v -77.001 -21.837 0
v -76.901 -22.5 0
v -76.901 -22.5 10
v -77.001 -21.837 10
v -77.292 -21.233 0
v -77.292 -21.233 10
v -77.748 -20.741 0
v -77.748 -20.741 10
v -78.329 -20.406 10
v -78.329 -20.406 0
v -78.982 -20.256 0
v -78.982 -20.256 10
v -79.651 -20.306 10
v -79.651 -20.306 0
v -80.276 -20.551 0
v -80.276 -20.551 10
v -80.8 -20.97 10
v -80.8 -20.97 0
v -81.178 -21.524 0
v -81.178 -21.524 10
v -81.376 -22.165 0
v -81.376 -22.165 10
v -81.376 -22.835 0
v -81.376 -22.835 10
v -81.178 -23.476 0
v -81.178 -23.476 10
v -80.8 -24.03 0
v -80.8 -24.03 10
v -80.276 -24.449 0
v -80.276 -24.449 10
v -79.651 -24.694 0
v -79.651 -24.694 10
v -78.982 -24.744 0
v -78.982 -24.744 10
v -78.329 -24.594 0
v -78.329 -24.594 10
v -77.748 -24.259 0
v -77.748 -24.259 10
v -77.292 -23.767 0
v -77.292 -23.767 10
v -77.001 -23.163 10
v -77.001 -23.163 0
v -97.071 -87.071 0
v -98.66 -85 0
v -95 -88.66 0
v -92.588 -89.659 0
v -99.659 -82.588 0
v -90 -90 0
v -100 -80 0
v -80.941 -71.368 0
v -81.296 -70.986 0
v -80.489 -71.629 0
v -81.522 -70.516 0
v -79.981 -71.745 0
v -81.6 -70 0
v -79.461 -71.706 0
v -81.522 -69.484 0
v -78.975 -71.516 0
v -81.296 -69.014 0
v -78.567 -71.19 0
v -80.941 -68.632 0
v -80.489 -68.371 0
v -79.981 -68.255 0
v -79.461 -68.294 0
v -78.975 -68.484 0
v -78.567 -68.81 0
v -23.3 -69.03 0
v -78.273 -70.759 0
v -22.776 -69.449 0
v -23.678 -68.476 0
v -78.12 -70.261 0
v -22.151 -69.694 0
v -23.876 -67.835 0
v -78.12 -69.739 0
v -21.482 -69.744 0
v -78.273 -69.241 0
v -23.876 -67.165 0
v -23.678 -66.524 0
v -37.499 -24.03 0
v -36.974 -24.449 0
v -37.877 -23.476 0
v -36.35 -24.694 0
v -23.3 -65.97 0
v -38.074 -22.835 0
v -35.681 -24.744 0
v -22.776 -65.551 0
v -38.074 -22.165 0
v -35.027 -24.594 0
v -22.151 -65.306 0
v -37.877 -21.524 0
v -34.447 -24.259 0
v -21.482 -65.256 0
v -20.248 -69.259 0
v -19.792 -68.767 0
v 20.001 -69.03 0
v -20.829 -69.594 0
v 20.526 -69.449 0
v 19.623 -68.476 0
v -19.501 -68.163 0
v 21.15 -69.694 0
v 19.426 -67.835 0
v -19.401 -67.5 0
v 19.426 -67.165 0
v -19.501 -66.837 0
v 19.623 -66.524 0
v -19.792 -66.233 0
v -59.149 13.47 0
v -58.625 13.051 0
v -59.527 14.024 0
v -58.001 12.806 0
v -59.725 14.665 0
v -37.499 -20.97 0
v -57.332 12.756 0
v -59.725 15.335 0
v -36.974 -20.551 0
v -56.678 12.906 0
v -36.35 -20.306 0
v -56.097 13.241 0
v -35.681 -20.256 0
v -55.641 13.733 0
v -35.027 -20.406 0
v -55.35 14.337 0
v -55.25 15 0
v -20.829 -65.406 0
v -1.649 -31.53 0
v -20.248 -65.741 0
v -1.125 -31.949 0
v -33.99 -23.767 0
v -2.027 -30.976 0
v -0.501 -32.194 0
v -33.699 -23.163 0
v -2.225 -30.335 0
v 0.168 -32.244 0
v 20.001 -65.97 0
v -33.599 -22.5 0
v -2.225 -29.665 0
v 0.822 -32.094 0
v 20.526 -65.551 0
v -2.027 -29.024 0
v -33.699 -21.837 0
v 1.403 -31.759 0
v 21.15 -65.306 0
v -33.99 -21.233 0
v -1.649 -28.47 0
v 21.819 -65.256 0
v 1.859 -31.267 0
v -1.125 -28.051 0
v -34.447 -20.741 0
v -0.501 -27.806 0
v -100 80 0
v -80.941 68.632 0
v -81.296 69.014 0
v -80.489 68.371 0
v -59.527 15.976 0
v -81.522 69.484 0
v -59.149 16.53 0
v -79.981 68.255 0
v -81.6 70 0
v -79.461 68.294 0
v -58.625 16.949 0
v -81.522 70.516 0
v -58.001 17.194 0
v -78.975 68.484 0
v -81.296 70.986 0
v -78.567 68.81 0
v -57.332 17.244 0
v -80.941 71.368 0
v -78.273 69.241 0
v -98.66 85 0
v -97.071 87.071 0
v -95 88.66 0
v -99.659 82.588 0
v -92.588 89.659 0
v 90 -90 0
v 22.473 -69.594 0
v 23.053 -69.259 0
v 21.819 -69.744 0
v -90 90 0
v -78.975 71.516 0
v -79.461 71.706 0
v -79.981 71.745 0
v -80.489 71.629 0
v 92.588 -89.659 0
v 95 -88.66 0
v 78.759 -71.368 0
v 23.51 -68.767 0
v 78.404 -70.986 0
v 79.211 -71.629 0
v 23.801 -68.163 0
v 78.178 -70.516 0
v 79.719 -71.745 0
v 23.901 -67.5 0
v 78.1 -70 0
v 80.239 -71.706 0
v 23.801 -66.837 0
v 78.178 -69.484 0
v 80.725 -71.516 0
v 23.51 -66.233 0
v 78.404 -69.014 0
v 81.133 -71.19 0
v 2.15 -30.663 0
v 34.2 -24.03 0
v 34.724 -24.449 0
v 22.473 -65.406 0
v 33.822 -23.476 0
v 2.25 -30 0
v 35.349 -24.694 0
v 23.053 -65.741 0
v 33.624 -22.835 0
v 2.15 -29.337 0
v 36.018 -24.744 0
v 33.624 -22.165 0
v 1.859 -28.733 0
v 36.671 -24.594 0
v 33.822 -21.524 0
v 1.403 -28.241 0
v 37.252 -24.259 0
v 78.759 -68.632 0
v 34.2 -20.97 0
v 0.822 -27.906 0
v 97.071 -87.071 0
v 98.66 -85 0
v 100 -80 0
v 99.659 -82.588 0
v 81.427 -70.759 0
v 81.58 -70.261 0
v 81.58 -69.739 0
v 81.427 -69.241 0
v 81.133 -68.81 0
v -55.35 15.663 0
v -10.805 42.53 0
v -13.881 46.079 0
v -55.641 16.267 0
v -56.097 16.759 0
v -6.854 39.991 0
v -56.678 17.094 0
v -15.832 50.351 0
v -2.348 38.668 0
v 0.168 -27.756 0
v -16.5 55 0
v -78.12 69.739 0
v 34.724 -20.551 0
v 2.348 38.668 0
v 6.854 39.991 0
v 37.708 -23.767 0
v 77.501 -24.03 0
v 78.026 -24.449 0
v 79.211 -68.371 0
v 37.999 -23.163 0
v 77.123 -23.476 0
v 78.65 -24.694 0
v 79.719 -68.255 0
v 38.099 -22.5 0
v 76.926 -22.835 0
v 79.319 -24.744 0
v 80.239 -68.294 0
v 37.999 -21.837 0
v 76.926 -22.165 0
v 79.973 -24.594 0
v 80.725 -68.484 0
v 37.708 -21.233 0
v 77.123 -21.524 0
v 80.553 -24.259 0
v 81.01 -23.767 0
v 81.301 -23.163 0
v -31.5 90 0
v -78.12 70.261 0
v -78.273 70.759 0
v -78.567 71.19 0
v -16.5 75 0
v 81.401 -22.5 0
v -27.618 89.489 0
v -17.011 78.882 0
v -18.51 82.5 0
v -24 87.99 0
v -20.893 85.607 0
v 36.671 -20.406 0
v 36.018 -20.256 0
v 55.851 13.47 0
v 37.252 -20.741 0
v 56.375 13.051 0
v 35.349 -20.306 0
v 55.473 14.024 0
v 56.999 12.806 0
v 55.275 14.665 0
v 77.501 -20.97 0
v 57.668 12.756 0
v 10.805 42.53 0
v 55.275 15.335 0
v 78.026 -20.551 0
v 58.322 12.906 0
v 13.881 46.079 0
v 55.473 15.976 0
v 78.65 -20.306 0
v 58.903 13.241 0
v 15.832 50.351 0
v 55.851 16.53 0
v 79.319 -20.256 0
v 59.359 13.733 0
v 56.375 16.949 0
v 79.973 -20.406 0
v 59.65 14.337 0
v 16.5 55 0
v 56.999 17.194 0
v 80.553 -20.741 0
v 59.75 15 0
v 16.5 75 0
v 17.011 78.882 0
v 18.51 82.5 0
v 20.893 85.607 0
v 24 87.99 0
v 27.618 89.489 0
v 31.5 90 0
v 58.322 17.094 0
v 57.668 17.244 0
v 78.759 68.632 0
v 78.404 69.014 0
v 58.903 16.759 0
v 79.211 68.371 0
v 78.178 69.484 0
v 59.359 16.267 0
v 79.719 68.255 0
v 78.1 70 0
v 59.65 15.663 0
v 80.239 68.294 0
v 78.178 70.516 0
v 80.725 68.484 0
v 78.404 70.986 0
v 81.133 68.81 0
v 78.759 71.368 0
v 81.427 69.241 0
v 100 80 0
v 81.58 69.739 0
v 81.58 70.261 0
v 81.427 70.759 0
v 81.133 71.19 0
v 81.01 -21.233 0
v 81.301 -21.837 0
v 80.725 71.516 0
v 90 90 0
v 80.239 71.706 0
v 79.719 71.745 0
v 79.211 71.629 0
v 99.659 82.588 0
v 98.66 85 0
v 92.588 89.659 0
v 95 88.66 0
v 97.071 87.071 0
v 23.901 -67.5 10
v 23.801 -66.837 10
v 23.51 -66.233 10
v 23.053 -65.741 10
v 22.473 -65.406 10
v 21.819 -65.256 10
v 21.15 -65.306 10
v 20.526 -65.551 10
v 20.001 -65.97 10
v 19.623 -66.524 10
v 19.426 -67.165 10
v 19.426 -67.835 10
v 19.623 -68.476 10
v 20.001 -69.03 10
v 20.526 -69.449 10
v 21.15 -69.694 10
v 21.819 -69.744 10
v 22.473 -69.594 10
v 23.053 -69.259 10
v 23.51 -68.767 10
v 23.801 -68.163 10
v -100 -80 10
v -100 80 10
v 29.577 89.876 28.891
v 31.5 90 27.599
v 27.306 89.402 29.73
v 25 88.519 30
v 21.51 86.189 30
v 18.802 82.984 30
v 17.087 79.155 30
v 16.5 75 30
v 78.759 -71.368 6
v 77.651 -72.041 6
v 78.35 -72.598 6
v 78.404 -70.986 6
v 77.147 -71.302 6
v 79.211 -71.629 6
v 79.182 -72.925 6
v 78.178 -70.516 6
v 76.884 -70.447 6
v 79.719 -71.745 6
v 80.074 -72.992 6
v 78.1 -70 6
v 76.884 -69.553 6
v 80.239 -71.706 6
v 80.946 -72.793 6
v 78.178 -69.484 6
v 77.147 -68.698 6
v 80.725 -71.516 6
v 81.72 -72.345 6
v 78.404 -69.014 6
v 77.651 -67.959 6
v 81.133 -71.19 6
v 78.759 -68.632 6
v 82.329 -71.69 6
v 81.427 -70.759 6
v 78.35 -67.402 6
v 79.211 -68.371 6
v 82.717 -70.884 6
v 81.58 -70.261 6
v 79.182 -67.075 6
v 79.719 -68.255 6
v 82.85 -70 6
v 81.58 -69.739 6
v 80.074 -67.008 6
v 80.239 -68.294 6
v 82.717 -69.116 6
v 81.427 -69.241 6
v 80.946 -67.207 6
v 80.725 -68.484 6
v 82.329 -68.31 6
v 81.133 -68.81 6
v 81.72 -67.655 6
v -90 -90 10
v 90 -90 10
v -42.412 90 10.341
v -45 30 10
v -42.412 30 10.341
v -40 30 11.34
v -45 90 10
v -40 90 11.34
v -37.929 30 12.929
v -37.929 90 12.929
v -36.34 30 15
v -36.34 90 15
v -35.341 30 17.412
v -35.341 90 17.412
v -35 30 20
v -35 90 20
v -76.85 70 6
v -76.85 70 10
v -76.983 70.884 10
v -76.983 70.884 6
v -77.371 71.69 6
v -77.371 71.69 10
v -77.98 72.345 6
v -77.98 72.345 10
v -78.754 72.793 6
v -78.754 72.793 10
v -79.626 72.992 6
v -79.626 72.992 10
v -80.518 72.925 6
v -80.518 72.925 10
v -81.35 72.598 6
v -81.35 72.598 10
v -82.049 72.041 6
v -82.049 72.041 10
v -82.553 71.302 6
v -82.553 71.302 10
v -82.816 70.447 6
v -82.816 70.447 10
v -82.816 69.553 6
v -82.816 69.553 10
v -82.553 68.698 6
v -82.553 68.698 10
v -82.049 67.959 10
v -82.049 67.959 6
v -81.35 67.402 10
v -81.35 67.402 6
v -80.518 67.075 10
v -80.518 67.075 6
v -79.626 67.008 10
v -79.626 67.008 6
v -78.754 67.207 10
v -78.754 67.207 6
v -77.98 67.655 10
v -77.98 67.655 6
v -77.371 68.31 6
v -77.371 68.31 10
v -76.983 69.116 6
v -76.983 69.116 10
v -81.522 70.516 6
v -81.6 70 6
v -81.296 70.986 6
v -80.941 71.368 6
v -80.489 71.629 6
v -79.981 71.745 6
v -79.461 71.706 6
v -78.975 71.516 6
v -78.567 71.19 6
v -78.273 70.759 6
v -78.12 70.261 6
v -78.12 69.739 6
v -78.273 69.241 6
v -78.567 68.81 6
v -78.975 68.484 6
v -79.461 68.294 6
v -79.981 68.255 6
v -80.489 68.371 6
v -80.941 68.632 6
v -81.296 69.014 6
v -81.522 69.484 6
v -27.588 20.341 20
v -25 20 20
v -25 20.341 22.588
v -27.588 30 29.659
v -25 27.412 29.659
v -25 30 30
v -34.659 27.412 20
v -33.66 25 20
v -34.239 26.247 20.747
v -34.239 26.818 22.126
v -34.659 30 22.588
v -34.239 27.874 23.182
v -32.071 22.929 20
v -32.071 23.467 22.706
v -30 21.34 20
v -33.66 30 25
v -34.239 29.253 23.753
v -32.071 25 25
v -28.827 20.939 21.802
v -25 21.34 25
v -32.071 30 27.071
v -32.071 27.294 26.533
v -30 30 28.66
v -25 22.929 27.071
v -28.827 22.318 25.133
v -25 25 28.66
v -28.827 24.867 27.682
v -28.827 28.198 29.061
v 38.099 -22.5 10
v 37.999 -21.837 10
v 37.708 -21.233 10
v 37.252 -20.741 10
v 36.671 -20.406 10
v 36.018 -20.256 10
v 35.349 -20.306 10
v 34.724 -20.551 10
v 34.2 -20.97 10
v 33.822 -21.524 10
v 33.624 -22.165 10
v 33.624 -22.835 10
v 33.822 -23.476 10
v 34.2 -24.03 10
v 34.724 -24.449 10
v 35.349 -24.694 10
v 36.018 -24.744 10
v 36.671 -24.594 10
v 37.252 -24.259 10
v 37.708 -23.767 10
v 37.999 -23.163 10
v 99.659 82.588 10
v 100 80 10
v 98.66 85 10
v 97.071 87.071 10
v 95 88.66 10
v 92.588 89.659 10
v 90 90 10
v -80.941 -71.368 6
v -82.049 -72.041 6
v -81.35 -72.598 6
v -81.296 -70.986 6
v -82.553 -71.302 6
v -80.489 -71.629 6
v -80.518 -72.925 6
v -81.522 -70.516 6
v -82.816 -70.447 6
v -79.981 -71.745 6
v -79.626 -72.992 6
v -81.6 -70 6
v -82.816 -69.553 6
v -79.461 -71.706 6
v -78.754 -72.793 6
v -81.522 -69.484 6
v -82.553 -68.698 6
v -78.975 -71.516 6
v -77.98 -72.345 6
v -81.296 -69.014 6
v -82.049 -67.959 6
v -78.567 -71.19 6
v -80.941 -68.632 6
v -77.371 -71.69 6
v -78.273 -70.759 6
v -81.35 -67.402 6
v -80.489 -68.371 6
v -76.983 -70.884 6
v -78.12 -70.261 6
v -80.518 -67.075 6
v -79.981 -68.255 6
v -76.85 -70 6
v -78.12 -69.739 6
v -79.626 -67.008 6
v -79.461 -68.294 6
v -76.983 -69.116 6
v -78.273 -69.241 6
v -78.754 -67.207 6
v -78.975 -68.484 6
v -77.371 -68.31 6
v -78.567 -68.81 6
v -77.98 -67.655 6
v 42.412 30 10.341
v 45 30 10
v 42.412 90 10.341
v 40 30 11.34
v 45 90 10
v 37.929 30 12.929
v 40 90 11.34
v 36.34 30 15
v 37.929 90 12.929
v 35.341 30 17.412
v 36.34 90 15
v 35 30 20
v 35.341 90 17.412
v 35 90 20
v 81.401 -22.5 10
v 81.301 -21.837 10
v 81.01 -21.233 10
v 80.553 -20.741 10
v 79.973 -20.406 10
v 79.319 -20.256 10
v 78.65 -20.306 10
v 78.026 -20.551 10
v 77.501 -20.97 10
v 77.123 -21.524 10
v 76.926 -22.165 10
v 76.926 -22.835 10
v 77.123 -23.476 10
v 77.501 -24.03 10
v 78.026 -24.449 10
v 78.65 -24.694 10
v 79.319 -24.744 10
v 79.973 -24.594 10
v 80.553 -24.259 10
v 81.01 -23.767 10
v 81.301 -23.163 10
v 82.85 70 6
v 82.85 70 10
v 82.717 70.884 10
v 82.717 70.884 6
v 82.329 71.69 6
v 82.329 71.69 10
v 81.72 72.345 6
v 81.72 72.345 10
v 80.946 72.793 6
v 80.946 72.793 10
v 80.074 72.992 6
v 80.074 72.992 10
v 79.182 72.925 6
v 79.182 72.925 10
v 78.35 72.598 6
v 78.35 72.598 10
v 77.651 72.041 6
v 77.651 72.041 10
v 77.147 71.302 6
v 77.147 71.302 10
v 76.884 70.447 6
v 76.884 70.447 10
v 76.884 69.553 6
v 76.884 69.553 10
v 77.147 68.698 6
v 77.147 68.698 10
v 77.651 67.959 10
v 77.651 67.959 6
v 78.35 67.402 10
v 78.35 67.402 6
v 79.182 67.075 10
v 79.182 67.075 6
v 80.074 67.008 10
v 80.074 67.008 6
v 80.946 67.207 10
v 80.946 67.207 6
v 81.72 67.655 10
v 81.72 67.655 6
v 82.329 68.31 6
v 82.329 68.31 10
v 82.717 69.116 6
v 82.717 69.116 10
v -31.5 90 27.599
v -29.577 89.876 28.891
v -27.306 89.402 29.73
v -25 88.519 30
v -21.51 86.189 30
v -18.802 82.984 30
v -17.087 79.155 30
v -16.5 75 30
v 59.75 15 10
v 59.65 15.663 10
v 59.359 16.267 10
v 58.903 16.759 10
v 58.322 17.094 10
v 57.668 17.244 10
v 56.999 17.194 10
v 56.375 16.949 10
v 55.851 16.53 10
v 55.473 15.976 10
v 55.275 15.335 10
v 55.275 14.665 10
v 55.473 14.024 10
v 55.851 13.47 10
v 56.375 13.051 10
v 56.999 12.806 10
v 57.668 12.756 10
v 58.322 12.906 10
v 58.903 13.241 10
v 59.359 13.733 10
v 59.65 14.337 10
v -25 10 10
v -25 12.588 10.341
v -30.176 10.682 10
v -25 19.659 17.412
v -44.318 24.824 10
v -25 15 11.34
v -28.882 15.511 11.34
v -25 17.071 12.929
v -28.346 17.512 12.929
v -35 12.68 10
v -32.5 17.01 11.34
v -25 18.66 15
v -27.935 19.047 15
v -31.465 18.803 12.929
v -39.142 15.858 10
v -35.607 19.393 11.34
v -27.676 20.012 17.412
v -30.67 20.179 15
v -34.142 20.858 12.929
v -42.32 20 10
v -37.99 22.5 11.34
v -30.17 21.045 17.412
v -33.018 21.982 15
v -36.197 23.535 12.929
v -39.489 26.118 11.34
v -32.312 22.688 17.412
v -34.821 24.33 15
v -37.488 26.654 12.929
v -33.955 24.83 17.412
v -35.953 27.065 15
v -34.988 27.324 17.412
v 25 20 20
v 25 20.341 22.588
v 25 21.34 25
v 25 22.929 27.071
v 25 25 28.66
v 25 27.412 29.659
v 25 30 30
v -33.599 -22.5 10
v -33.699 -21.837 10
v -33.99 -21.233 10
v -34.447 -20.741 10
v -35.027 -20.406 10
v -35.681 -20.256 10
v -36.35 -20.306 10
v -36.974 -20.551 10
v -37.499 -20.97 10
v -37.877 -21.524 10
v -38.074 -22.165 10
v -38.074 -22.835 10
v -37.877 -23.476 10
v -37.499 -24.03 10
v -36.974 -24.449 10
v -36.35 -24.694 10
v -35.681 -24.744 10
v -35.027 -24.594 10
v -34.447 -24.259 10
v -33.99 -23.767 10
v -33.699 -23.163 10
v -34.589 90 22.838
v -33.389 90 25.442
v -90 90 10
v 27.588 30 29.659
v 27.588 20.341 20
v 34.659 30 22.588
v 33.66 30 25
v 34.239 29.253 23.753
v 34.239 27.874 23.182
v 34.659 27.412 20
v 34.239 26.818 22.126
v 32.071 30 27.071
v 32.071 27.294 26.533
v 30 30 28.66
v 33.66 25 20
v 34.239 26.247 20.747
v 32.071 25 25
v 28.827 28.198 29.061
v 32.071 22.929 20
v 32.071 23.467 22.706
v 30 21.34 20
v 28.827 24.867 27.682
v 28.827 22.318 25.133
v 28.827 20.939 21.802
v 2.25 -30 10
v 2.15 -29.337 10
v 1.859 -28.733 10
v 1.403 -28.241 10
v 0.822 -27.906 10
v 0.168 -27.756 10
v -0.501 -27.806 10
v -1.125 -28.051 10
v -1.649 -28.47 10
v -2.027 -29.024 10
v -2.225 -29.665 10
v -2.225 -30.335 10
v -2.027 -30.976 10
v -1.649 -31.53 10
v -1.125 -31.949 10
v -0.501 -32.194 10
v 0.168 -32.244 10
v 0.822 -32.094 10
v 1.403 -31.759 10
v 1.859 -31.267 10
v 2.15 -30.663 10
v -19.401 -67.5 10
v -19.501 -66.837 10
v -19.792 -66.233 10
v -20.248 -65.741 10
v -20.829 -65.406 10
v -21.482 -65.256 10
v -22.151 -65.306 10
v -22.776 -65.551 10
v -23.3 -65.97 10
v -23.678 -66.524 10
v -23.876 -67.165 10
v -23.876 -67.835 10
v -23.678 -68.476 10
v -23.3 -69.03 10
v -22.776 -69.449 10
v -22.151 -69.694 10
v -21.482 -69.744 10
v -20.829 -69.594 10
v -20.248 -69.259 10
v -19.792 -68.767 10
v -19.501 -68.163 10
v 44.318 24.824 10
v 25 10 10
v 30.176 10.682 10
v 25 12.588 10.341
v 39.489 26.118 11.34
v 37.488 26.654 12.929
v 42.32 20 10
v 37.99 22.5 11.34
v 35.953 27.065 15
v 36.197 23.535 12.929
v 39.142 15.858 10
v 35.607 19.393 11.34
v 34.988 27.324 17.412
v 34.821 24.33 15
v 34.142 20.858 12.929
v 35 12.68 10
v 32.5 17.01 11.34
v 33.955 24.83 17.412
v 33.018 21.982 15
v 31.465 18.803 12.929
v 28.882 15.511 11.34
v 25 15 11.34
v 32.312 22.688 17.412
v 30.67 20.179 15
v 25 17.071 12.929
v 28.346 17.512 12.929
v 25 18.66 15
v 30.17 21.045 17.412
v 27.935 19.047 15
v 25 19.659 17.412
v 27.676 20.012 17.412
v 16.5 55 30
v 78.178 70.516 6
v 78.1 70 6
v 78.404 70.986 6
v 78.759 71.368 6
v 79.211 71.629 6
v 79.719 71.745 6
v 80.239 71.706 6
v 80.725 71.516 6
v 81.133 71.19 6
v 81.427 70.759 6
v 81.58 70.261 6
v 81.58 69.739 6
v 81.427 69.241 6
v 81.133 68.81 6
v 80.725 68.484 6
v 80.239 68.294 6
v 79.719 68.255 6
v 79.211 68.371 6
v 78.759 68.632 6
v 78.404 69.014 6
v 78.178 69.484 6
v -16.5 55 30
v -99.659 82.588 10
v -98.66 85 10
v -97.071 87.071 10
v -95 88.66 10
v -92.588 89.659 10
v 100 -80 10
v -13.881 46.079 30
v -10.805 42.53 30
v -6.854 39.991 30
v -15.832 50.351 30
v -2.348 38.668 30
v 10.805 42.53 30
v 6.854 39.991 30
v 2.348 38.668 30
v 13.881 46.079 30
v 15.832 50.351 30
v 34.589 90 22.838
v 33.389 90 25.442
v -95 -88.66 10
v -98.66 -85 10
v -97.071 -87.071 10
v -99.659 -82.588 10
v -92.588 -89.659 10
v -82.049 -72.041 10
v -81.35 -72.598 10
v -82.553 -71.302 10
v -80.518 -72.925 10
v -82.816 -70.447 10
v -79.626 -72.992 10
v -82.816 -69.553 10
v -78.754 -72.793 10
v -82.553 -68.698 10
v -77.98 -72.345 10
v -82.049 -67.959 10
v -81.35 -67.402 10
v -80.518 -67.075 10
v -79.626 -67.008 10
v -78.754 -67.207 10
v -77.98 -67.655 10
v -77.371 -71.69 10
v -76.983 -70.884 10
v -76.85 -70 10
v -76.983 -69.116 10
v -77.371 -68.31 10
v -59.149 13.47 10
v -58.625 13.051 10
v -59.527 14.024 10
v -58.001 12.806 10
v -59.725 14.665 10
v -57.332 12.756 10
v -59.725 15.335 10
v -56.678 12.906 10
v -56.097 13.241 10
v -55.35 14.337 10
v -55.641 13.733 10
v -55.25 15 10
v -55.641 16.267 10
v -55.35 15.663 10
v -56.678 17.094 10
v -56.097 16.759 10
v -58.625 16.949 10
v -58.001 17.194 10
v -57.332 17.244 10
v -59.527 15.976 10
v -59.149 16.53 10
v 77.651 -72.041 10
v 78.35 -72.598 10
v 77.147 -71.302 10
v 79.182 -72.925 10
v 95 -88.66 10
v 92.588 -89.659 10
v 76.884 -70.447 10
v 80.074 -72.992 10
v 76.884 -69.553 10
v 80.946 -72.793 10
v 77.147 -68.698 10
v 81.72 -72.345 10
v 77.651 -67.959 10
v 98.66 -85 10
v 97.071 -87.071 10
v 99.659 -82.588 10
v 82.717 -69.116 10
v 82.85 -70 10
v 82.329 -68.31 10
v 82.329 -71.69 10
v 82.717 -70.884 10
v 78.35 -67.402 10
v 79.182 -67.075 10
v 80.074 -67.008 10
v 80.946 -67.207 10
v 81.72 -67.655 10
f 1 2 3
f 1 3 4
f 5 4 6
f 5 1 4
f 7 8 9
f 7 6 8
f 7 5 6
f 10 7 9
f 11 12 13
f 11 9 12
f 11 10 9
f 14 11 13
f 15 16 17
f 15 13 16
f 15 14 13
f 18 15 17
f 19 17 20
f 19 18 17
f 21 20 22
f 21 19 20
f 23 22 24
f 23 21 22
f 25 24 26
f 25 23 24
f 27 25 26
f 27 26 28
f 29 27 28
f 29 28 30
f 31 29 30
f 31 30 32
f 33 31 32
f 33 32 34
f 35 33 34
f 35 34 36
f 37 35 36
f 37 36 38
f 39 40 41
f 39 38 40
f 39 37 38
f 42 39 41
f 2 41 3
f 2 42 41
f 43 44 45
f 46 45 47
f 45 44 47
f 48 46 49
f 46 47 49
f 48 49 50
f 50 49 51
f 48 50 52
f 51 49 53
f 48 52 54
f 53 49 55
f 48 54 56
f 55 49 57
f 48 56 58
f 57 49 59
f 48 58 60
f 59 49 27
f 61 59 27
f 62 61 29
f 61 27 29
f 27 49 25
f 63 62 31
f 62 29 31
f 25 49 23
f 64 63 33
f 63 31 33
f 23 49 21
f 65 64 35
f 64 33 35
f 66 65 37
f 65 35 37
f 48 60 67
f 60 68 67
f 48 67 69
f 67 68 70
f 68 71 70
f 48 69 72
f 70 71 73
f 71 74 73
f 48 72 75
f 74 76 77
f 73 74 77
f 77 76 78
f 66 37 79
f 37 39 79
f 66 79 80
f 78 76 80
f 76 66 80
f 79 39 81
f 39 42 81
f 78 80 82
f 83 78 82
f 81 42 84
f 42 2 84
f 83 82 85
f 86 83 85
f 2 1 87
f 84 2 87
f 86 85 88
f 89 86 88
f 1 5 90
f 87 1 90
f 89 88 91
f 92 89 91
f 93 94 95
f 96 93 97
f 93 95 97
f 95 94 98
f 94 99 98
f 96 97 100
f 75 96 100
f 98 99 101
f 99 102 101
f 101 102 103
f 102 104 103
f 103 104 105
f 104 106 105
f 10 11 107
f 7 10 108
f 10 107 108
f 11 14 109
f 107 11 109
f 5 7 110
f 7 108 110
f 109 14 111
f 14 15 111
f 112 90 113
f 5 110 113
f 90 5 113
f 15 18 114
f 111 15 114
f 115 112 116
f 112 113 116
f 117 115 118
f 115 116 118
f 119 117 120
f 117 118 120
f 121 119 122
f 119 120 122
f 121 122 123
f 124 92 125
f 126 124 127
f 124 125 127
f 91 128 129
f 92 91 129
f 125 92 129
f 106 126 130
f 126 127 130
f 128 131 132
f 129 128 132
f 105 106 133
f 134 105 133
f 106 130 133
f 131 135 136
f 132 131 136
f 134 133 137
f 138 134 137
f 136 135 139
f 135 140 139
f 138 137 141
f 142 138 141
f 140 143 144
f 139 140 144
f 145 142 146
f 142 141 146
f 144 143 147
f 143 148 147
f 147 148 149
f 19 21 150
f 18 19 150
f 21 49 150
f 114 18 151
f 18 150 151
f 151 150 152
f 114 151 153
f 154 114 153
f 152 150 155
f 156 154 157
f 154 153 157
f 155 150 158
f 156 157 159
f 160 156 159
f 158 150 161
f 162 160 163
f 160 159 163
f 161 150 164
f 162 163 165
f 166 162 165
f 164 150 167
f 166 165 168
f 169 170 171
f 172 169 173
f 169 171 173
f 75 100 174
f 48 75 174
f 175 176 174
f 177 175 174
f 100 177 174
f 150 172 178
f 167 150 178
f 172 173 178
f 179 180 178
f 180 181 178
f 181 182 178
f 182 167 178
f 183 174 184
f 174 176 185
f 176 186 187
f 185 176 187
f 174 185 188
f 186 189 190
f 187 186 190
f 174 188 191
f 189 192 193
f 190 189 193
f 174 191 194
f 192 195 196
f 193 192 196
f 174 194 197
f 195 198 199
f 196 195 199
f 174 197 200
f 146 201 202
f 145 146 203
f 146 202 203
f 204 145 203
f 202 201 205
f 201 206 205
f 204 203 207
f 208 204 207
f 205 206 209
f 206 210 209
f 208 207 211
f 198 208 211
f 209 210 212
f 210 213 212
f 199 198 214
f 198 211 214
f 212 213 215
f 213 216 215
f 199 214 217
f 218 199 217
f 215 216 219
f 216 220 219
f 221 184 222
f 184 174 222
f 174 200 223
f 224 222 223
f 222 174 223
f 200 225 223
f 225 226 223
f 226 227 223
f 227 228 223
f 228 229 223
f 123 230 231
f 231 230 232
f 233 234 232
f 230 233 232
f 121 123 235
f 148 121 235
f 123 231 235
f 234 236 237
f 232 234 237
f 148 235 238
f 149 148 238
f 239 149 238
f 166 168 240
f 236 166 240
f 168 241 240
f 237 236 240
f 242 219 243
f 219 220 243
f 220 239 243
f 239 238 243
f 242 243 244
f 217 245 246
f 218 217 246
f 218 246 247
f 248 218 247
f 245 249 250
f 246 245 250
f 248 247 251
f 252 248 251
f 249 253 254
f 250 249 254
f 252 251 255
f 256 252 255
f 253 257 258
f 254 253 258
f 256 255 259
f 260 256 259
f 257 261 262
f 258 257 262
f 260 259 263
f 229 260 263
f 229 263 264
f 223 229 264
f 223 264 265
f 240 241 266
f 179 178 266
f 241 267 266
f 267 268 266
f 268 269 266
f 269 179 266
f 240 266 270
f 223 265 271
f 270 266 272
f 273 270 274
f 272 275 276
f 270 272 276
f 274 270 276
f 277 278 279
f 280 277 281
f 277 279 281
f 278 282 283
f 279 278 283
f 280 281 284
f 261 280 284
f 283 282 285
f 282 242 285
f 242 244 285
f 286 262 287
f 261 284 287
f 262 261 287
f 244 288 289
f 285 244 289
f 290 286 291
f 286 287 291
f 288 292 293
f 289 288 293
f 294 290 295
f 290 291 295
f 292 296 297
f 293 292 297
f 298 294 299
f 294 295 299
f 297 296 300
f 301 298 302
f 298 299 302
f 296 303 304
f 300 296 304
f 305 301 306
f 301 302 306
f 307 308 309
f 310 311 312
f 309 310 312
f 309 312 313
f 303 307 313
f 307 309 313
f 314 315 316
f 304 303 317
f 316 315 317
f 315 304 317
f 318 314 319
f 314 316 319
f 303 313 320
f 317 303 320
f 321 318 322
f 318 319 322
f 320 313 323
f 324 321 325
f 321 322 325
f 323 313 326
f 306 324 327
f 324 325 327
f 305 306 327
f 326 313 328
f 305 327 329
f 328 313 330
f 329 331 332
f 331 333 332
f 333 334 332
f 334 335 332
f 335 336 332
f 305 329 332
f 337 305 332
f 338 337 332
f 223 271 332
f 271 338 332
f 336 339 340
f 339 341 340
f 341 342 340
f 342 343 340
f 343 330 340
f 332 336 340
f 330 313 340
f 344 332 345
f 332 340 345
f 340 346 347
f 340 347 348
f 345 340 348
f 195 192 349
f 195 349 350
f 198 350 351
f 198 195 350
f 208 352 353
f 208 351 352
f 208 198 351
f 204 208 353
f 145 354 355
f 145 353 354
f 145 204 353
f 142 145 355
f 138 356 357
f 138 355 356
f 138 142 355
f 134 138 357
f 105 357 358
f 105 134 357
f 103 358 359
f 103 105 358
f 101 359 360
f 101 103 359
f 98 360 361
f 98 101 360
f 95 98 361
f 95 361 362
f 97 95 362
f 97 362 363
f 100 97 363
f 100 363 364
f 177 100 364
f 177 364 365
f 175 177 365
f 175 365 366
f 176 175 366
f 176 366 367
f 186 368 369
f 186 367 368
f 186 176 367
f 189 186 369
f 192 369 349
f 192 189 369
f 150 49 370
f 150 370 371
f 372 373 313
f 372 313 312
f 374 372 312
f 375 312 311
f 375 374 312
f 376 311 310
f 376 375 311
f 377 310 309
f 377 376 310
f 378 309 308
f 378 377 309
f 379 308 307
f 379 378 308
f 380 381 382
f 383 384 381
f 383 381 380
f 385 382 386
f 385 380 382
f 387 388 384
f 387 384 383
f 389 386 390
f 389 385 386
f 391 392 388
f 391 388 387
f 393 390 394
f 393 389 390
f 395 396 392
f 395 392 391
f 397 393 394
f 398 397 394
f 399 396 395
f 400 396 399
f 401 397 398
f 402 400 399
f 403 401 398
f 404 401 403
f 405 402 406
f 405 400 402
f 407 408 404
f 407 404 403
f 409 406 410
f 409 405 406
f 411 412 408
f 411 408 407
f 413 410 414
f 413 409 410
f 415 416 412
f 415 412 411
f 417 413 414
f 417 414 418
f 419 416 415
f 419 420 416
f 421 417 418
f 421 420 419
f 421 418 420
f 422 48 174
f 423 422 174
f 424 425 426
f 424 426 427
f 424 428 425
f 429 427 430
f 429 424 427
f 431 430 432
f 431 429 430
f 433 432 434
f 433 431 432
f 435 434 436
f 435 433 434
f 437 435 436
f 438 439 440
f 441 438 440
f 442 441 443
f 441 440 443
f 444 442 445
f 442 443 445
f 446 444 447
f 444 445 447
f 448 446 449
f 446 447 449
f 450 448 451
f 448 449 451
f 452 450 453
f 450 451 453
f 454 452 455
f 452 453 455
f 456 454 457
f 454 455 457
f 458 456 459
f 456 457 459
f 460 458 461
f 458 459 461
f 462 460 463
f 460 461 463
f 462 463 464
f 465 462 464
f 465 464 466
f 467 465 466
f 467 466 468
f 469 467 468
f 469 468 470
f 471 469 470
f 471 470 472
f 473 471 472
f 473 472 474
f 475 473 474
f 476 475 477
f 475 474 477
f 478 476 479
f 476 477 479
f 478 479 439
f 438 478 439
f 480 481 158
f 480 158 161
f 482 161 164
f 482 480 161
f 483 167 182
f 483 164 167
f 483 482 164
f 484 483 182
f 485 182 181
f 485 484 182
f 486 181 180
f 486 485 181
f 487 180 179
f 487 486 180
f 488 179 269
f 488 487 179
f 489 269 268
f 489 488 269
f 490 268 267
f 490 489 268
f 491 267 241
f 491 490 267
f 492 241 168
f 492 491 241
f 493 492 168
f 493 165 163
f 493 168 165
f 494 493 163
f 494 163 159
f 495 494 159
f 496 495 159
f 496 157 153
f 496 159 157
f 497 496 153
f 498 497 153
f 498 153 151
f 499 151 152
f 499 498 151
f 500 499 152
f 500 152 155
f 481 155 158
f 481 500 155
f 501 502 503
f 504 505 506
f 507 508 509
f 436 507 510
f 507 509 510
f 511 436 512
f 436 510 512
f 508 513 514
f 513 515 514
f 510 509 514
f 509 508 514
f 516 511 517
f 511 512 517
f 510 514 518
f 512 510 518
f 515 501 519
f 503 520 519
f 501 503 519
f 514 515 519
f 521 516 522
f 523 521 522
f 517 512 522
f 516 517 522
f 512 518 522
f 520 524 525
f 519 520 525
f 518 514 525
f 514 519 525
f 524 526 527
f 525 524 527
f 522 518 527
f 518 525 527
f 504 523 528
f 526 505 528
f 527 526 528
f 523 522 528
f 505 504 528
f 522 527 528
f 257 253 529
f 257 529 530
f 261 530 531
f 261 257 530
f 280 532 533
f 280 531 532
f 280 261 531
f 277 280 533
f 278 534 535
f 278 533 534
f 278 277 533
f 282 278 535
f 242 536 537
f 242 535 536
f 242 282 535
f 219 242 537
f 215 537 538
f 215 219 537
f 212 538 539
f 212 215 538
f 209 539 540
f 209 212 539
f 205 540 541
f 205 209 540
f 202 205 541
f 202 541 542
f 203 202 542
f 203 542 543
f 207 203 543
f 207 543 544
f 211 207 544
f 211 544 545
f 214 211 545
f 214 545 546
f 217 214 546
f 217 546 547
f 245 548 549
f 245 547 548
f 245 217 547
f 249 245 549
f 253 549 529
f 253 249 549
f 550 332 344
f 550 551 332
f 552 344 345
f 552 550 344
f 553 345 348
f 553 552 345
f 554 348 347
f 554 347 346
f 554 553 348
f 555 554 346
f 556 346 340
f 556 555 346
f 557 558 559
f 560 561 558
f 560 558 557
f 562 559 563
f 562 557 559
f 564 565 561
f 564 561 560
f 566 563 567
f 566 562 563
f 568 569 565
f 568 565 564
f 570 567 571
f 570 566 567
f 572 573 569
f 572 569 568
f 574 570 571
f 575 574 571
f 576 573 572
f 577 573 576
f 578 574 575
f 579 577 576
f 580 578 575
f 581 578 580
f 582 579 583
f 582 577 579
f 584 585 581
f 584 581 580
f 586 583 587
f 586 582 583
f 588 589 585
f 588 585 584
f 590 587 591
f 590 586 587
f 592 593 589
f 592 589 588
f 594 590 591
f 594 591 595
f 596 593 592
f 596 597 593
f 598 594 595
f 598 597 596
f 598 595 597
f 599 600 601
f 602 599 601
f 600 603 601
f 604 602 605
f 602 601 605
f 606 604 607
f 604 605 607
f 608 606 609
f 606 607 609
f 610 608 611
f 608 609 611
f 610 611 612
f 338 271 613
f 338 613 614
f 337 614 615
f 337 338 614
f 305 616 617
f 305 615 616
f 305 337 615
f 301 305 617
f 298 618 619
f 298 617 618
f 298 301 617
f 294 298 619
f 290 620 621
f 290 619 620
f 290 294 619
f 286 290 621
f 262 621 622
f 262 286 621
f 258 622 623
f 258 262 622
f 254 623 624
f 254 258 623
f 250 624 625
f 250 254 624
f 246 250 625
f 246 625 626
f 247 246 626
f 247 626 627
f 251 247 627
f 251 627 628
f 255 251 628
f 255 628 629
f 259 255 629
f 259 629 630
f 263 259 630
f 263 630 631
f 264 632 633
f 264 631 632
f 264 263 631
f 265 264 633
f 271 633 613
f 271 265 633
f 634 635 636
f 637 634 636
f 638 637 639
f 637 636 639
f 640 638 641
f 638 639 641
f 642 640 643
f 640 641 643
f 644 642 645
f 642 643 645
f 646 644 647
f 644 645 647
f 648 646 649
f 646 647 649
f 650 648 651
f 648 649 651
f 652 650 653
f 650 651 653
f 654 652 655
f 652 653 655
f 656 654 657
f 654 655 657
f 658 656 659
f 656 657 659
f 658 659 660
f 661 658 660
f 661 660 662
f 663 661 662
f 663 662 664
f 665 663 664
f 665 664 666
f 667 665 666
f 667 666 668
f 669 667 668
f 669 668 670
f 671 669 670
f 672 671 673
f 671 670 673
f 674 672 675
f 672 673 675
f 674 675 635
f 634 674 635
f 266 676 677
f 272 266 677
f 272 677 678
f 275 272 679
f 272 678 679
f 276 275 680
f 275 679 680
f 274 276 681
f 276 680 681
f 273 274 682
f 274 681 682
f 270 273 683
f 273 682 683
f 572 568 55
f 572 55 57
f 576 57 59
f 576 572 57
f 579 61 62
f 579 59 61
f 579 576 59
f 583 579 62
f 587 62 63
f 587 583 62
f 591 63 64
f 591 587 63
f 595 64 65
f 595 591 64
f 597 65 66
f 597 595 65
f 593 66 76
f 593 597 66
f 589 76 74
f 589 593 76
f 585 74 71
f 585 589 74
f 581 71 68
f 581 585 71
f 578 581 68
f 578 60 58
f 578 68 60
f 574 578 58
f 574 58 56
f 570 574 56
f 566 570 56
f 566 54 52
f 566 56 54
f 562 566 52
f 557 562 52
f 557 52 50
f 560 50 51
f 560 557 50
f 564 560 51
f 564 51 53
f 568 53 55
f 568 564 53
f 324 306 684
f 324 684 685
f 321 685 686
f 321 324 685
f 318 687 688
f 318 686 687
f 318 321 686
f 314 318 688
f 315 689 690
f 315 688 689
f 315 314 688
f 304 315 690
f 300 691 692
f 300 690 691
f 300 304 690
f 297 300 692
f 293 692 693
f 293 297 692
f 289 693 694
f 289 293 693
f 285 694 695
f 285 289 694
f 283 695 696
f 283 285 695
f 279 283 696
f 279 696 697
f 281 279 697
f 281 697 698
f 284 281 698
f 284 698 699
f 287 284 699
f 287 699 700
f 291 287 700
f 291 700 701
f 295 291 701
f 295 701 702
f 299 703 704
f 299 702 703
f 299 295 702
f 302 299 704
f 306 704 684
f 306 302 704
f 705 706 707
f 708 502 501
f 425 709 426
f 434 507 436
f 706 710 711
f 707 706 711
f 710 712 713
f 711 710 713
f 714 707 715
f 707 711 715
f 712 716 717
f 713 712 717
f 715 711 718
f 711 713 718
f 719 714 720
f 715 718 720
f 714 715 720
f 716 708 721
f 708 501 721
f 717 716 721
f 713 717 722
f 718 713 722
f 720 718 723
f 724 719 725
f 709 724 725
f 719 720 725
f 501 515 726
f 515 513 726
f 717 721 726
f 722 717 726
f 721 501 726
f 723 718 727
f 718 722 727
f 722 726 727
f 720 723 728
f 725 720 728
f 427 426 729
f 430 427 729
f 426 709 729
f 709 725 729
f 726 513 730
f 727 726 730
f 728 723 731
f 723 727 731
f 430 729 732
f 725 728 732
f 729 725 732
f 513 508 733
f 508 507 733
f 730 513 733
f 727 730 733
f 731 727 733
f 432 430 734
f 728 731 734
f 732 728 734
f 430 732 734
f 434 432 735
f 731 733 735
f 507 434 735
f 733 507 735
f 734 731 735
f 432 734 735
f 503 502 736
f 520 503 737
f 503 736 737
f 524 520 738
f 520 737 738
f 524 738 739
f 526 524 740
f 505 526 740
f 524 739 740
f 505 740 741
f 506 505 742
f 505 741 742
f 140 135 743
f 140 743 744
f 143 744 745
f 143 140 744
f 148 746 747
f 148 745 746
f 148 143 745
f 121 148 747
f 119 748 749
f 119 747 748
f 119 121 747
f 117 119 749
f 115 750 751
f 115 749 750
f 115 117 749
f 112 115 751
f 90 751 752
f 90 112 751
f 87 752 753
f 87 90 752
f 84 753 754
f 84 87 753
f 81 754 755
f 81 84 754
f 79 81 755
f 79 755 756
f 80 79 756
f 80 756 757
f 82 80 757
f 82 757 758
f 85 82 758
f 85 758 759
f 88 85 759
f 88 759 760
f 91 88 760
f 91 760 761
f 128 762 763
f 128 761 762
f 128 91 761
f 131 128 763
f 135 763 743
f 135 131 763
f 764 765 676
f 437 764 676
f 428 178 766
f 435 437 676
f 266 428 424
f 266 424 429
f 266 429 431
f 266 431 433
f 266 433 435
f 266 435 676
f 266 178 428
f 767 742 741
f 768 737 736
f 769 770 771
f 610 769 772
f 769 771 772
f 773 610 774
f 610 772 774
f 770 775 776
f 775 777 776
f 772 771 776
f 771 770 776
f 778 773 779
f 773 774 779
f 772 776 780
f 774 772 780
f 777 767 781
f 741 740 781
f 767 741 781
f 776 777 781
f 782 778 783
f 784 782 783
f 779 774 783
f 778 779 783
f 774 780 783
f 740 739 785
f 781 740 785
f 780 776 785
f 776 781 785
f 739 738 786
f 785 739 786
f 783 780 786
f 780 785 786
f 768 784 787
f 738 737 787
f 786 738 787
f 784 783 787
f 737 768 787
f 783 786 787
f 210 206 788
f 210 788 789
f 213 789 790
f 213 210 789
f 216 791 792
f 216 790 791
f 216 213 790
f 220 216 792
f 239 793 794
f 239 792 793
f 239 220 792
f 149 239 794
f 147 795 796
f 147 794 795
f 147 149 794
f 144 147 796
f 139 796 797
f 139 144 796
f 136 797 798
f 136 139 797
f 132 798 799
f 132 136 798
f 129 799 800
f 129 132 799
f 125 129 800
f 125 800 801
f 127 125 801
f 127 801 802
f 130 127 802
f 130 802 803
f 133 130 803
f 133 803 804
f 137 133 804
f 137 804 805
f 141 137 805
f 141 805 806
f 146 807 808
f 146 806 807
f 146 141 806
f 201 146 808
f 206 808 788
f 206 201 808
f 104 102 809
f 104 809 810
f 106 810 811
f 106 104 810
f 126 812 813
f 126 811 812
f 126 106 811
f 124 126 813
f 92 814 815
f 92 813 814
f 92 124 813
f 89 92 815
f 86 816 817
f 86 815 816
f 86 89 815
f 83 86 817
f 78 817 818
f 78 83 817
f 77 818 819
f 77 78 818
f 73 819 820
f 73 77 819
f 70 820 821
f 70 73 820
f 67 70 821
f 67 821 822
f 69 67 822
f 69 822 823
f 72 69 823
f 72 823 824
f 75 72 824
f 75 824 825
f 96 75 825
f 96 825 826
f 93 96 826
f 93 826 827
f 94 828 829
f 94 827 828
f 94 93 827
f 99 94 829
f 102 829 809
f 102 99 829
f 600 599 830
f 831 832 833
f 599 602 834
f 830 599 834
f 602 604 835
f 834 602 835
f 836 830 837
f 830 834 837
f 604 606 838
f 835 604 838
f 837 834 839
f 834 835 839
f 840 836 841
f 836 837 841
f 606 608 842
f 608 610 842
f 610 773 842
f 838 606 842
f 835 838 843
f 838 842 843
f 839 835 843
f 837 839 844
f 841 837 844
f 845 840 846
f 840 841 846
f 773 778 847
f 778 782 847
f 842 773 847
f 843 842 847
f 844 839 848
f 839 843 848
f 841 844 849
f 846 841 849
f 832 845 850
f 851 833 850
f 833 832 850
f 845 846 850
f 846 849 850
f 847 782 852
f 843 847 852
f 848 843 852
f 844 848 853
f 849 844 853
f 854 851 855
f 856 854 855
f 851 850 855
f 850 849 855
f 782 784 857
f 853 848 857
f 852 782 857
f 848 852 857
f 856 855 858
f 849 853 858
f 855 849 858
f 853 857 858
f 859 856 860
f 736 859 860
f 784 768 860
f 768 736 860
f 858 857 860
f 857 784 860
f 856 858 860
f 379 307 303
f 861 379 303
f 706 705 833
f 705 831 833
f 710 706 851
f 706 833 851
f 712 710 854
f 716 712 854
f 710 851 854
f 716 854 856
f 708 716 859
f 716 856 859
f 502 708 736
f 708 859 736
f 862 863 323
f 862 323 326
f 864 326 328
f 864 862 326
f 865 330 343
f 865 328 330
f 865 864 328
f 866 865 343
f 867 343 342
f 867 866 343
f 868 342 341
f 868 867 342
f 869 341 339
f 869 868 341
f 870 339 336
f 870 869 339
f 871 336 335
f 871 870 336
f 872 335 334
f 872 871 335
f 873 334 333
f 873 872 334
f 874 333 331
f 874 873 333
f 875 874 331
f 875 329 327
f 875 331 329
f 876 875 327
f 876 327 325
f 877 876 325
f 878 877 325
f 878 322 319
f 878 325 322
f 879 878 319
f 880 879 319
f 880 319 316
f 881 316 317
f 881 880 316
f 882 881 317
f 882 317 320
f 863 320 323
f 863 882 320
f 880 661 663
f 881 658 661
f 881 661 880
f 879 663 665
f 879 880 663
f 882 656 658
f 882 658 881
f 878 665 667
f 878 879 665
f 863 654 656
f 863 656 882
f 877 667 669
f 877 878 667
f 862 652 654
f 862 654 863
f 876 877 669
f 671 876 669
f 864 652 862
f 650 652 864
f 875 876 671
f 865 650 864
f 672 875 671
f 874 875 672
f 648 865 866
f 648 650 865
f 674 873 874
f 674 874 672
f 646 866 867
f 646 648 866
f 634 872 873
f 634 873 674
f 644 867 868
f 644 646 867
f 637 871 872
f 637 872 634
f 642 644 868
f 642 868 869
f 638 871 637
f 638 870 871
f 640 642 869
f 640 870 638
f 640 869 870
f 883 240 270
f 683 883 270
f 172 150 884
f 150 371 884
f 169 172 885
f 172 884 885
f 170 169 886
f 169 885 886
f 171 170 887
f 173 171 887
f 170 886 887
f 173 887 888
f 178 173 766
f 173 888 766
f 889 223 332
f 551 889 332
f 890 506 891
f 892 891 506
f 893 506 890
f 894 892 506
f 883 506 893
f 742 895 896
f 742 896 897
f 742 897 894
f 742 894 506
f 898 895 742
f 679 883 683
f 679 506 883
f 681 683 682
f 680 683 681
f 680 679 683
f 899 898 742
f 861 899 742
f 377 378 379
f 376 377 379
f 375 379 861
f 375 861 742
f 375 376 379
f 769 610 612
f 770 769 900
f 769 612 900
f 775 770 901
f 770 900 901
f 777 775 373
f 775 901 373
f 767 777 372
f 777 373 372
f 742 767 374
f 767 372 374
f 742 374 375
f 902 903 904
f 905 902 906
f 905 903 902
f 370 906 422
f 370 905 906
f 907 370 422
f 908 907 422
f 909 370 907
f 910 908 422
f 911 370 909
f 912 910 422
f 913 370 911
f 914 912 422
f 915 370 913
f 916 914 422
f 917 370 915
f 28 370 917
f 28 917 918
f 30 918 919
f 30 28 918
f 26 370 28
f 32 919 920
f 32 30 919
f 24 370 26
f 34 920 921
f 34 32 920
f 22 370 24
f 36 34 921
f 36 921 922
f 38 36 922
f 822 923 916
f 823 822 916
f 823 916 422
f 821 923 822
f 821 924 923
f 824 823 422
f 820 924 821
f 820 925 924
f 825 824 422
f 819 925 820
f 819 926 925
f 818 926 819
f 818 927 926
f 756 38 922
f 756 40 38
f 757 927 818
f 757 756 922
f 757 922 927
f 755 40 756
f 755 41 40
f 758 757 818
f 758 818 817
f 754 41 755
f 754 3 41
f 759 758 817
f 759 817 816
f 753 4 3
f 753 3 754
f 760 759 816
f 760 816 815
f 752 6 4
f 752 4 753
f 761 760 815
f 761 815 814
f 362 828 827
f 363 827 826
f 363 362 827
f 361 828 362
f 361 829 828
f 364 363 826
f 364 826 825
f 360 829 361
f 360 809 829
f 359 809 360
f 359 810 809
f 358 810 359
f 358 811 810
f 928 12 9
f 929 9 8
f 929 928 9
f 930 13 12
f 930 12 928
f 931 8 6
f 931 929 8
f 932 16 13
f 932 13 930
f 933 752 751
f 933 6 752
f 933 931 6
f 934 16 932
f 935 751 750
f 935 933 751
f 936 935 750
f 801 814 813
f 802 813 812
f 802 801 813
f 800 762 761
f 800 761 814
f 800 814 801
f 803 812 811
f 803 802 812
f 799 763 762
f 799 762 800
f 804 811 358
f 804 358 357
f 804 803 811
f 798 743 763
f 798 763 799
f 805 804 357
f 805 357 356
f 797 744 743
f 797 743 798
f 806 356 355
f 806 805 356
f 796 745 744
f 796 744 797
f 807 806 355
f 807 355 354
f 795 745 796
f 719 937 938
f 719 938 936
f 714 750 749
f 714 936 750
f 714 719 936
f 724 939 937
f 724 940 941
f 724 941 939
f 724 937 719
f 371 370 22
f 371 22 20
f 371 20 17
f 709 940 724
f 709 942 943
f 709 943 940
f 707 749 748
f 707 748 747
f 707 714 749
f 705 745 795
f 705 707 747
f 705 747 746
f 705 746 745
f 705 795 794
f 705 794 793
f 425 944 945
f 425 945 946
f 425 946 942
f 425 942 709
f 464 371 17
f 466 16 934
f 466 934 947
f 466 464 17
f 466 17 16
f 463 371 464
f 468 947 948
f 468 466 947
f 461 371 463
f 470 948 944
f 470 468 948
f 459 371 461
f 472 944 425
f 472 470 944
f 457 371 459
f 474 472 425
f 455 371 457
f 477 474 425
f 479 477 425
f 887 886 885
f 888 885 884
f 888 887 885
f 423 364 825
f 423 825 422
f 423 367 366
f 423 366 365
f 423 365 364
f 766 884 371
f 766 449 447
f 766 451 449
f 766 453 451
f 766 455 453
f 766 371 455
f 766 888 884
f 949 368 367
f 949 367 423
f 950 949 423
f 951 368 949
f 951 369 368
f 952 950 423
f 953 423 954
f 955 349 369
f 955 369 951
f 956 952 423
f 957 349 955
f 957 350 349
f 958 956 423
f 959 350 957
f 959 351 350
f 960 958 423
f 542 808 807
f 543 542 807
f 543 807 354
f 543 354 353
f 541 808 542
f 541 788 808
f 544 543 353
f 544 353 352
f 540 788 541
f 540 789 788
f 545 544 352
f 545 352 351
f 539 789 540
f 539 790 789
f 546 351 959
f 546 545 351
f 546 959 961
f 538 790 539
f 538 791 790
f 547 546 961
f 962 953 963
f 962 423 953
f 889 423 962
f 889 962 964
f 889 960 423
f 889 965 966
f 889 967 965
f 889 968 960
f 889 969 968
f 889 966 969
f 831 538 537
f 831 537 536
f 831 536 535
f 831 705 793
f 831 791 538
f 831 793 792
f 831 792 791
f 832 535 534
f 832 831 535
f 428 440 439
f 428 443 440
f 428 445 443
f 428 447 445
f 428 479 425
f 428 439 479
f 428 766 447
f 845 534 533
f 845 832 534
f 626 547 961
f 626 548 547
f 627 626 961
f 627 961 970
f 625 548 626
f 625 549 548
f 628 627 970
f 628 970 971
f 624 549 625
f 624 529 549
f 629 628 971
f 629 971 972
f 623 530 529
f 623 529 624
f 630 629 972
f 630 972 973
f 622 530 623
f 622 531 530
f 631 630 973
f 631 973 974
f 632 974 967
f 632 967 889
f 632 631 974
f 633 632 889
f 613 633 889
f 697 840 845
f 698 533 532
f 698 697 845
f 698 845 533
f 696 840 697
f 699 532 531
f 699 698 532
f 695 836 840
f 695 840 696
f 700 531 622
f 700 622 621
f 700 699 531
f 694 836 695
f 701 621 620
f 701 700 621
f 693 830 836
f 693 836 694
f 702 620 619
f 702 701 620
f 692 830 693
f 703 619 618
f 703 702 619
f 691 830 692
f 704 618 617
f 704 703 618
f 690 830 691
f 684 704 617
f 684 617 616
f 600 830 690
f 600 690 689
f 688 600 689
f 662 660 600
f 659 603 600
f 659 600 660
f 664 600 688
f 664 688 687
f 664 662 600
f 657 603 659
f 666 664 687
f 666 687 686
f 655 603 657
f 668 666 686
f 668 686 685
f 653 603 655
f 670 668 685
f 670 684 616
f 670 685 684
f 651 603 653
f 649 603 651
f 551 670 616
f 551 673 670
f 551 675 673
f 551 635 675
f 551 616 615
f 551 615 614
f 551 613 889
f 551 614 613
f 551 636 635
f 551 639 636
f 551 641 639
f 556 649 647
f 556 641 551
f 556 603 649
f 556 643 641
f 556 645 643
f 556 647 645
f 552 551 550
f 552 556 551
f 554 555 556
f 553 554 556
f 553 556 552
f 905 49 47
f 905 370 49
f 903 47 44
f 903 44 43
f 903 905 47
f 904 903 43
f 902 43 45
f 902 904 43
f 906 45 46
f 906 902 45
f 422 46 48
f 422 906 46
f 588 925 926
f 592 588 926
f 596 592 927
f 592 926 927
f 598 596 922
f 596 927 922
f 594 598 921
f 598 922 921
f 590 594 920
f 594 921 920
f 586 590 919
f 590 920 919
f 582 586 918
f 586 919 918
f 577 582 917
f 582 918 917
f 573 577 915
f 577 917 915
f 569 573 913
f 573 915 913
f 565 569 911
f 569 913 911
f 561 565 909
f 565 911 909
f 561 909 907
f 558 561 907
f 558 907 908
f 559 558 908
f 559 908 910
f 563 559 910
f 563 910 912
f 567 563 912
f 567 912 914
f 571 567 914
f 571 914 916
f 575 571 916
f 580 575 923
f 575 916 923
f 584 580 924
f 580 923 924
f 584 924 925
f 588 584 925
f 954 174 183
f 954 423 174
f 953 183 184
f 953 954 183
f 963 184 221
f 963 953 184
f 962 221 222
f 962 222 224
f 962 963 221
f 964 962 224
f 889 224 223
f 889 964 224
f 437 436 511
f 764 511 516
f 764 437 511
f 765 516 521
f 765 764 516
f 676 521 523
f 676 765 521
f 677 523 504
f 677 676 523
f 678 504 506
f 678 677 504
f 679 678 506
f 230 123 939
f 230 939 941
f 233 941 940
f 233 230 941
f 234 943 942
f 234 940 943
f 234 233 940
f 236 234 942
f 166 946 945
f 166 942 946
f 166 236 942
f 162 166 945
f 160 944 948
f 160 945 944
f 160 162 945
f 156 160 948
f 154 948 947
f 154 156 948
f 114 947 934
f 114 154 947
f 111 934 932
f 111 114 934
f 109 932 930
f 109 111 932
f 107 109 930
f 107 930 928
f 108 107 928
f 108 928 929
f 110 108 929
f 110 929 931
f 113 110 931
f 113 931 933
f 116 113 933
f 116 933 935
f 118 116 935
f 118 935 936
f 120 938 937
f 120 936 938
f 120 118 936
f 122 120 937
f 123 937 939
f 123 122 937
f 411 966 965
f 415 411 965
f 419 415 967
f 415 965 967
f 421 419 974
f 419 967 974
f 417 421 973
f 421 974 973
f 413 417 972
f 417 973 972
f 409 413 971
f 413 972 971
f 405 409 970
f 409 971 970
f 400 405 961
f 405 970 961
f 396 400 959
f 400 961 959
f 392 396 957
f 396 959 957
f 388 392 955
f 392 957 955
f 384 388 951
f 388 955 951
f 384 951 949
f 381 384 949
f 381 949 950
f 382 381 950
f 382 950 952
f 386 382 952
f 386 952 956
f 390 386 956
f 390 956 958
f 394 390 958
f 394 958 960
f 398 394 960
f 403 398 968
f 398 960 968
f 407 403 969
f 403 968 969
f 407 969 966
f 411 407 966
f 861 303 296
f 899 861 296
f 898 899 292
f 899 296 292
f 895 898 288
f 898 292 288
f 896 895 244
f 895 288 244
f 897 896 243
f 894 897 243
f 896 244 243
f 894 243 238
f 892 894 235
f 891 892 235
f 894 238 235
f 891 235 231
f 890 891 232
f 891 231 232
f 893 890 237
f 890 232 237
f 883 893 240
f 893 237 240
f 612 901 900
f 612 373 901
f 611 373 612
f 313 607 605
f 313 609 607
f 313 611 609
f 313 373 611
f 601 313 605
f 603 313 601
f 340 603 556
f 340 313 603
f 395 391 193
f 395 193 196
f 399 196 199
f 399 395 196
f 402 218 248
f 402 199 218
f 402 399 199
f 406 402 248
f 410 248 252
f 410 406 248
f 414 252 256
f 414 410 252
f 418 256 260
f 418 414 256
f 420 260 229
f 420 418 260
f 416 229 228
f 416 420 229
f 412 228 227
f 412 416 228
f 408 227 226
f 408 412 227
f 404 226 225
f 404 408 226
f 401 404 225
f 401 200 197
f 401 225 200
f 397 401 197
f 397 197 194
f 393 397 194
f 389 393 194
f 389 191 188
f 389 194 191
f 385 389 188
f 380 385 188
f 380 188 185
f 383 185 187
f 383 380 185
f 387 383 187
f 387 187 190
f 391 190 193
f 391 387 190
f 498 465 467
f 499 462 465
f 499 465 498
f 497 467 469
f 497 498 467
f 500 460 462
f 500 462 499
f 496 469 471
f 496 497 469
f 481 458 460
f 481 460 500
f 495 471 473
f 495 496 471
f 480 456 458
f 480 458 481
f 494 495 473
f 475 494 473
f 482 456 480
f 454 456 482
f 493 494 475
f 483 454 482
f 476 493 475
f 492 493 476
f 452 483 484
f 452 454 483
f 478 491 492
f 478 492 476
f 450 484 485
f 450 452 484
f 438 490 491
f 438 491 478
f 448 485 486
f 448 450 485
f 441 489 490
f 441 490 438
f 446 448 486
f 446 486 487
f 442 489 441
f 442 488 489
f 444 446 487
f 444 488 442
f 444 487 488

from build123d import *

# Parameters (mm, degrees)
SKETCH1_W               = 200
SKETCH1_H               = 180
BOSS_EXTRUDE1_DEPTH     = 10
FILLET1_R               = 10
CUT_EXTRUDE5_DEPTH      = 135.907375632
CUT_EXTRUDE5_DEPTH_BACK = 135.907375632
SKETCH26_R              = 1.75
SKETCH27_R              = 3
CUT_EXTRUDE6_DEPTH      = 4
SKETCH28_W              = 70
SKETCH28_H              = 70
BOSS_EXTRUDE2_DEPTH     = 20
CUT_EXTRUDE8_DEPTH      = 138.840487521
CUT_EXTRUDE8_DEPTH_BACK = 138.840487521
FILLET3_R               = 10
FILLET4_R               = 15
CUT_EXTRUDE9_DEPTH      = 137.014705168
CUT_EXTRUDE9_DEPTH_BACK = 137.014705168
SKETCH30_R              = 2.25


with BuildPart() as part:
    # Sketch1 → Boss-Extrude1 (new body)
    with BuildSketch(Plane.XY):
        Rectangle(SKETCH1_W, SKETCH1_H)
    extrude(amount=BOSS_EXTRUDE1_DEPTH)

    # Fillet1
    fillet1_edges = [part.edges().sort_by_distance(p)[0] for p in [
        (100, -90, 5),
        (-100, -90, 5),
        (-100, 90, 5),
        (100, 90, 5),
    ]]
    fillet(fillet1_edges, radius=FILLET1_R)

    # Sketch26 → Cut-Extrude5 (cut, two sides: drawn at the far end of the back side and taken through both)
    with BuildSketch(Plane(origin=(0, 0, 0), x_dir=(-1, 0, 0), z_dir=(0, 0, -1)).offset(-CUT_EXTRUDE5_DEPTH_BACK)):
        with Locations((-79.85, 70)):
            Circle(SKETCH26_R)
        with Locations((-79.85, -70)):
            Circle(SKETCH26_R)
        with Locations((79.85, -70)):
            Circle(SKETCH26_R)
        with Locations((79.85, 70)):
            Circle(SKETCH26_R)
    extrude(amount=CUT_EXTRUDE5_DEPTH + CUT_EXTRUDE5_DEPTH_BACK, mode=Mode.SUBTRACT)

    # Sketch27 → Cut-Extrude6 (cut)
    with BuildSketch(Plane.XY.offset(10)):
        with Locations((-79.85, 70)):
            Circle(SKETCH27_R)
        with Locations((79.85, 70)):
            Circle(SKETCH27_R)
        with Locations((79.85, -70)):
            Circle(SKETCH27_R)
        with Locations((-79.85, -70)):
            Circle(SKETCH27_R)
    extrude(amount=-CUT_EXTRUDE6_DEPTH, mode=Mode.SUBTRACT)

    # Sketch28 → Boss-Extrude2 (add)
    with BuildSketch(Plane.XY.offset(10)):
        with Locations((0, 55)):
            Rectangle(SKETCH28_W, SKETCH28_H)
    extrude(amount=BOSS_EXTRUDE2_DEPTH)

    # Sketch29 → Cut-Extrude8 (cut, two sides: drawn at the far end of the back side and taken through both)
    with BuildSketch(Plane.XY.offset(30).offset(-CUT_EXTRUDE8_DEPTH_BACK)):
        with BuildLine():
            Line((-16.5, 55), (-16.5, 90))
            Line((-16.5, 90), (16.5, 90))
            Line((16.5, 90), (16.5, 55))
            ThreePointArc((16.5, 55), (0, 38.5), (-16.5, 55))
        make_face()
    extrude(amount=CUT_EXTRUDE8_DEPTH + CUT_EXTRUDE8_DEPTH_BACK, mode=Mode.SUBTRACT)

    # Fillet3
    fillet3_edges = [part.edges().sort_by_distance(p)[0] for p in [
        (0, 20, 30),
        (-35, 20, 20),
        (0, 20, 10),
        (-35, 55, 30),
        (-35, 55, 10),
        (35, 55, 30),
        (35, 20, 20),
        (35, 55, 10),
    ]]
    fillet(fillet3_edges, radius=FILLET3_R - 0.0001)  # a hair under: the kernel refuses the full size

    # Fillet4
    fillet4_edges = [part.edges().sort_by_distance(p)[0] for p in [
        (16.5, 90, 15),
        (-16.5, 90, 15),
    ]]
    fillet(fillet4_edges, radius=FILLET4_R)

    # Sketch30 → Cut-Extrude9 (cut, two sides: drawn at the far end of the back side and taken through both)
    with BuildSketch(Plane.XY.offset(10).offset(-CUT_EXTRUDE9_DEPTH_BACK)):
        with Locations((-21.650635095, -67.5)):
            Circle(SKETCH30_R)
        with Locations((21.650635095, -67.5)):
            Circle(SKETCH30_R)
        with Locations((0, -30)):
            Circle(SKETCH30_R)
        with Locations((-79.150635095, -22.5)):
            Circle(SKETCH30_R)
        with Locations((-35.849364905, -22.5)):
            Circle(SKETCH30_R)
        with Locations((-57.5, 15)):
            Circle(SKETCH30_R)
        with Locations((35.849364905, -22.5)):
            Circle(SKETCH30_R)
        with Locations((79.150635095, -22.5)):
            Circle(SKETCH30_R)
        with Locations((57.5, 15)):
            Circle(SKETCH30_R)
    extrude(amount=CUT_EXTRUDE9_DEPTH + CUT_EXTRUDE9_DEPTH_BACK, mode=Mode.SUBTRACT)


solid = part.part
